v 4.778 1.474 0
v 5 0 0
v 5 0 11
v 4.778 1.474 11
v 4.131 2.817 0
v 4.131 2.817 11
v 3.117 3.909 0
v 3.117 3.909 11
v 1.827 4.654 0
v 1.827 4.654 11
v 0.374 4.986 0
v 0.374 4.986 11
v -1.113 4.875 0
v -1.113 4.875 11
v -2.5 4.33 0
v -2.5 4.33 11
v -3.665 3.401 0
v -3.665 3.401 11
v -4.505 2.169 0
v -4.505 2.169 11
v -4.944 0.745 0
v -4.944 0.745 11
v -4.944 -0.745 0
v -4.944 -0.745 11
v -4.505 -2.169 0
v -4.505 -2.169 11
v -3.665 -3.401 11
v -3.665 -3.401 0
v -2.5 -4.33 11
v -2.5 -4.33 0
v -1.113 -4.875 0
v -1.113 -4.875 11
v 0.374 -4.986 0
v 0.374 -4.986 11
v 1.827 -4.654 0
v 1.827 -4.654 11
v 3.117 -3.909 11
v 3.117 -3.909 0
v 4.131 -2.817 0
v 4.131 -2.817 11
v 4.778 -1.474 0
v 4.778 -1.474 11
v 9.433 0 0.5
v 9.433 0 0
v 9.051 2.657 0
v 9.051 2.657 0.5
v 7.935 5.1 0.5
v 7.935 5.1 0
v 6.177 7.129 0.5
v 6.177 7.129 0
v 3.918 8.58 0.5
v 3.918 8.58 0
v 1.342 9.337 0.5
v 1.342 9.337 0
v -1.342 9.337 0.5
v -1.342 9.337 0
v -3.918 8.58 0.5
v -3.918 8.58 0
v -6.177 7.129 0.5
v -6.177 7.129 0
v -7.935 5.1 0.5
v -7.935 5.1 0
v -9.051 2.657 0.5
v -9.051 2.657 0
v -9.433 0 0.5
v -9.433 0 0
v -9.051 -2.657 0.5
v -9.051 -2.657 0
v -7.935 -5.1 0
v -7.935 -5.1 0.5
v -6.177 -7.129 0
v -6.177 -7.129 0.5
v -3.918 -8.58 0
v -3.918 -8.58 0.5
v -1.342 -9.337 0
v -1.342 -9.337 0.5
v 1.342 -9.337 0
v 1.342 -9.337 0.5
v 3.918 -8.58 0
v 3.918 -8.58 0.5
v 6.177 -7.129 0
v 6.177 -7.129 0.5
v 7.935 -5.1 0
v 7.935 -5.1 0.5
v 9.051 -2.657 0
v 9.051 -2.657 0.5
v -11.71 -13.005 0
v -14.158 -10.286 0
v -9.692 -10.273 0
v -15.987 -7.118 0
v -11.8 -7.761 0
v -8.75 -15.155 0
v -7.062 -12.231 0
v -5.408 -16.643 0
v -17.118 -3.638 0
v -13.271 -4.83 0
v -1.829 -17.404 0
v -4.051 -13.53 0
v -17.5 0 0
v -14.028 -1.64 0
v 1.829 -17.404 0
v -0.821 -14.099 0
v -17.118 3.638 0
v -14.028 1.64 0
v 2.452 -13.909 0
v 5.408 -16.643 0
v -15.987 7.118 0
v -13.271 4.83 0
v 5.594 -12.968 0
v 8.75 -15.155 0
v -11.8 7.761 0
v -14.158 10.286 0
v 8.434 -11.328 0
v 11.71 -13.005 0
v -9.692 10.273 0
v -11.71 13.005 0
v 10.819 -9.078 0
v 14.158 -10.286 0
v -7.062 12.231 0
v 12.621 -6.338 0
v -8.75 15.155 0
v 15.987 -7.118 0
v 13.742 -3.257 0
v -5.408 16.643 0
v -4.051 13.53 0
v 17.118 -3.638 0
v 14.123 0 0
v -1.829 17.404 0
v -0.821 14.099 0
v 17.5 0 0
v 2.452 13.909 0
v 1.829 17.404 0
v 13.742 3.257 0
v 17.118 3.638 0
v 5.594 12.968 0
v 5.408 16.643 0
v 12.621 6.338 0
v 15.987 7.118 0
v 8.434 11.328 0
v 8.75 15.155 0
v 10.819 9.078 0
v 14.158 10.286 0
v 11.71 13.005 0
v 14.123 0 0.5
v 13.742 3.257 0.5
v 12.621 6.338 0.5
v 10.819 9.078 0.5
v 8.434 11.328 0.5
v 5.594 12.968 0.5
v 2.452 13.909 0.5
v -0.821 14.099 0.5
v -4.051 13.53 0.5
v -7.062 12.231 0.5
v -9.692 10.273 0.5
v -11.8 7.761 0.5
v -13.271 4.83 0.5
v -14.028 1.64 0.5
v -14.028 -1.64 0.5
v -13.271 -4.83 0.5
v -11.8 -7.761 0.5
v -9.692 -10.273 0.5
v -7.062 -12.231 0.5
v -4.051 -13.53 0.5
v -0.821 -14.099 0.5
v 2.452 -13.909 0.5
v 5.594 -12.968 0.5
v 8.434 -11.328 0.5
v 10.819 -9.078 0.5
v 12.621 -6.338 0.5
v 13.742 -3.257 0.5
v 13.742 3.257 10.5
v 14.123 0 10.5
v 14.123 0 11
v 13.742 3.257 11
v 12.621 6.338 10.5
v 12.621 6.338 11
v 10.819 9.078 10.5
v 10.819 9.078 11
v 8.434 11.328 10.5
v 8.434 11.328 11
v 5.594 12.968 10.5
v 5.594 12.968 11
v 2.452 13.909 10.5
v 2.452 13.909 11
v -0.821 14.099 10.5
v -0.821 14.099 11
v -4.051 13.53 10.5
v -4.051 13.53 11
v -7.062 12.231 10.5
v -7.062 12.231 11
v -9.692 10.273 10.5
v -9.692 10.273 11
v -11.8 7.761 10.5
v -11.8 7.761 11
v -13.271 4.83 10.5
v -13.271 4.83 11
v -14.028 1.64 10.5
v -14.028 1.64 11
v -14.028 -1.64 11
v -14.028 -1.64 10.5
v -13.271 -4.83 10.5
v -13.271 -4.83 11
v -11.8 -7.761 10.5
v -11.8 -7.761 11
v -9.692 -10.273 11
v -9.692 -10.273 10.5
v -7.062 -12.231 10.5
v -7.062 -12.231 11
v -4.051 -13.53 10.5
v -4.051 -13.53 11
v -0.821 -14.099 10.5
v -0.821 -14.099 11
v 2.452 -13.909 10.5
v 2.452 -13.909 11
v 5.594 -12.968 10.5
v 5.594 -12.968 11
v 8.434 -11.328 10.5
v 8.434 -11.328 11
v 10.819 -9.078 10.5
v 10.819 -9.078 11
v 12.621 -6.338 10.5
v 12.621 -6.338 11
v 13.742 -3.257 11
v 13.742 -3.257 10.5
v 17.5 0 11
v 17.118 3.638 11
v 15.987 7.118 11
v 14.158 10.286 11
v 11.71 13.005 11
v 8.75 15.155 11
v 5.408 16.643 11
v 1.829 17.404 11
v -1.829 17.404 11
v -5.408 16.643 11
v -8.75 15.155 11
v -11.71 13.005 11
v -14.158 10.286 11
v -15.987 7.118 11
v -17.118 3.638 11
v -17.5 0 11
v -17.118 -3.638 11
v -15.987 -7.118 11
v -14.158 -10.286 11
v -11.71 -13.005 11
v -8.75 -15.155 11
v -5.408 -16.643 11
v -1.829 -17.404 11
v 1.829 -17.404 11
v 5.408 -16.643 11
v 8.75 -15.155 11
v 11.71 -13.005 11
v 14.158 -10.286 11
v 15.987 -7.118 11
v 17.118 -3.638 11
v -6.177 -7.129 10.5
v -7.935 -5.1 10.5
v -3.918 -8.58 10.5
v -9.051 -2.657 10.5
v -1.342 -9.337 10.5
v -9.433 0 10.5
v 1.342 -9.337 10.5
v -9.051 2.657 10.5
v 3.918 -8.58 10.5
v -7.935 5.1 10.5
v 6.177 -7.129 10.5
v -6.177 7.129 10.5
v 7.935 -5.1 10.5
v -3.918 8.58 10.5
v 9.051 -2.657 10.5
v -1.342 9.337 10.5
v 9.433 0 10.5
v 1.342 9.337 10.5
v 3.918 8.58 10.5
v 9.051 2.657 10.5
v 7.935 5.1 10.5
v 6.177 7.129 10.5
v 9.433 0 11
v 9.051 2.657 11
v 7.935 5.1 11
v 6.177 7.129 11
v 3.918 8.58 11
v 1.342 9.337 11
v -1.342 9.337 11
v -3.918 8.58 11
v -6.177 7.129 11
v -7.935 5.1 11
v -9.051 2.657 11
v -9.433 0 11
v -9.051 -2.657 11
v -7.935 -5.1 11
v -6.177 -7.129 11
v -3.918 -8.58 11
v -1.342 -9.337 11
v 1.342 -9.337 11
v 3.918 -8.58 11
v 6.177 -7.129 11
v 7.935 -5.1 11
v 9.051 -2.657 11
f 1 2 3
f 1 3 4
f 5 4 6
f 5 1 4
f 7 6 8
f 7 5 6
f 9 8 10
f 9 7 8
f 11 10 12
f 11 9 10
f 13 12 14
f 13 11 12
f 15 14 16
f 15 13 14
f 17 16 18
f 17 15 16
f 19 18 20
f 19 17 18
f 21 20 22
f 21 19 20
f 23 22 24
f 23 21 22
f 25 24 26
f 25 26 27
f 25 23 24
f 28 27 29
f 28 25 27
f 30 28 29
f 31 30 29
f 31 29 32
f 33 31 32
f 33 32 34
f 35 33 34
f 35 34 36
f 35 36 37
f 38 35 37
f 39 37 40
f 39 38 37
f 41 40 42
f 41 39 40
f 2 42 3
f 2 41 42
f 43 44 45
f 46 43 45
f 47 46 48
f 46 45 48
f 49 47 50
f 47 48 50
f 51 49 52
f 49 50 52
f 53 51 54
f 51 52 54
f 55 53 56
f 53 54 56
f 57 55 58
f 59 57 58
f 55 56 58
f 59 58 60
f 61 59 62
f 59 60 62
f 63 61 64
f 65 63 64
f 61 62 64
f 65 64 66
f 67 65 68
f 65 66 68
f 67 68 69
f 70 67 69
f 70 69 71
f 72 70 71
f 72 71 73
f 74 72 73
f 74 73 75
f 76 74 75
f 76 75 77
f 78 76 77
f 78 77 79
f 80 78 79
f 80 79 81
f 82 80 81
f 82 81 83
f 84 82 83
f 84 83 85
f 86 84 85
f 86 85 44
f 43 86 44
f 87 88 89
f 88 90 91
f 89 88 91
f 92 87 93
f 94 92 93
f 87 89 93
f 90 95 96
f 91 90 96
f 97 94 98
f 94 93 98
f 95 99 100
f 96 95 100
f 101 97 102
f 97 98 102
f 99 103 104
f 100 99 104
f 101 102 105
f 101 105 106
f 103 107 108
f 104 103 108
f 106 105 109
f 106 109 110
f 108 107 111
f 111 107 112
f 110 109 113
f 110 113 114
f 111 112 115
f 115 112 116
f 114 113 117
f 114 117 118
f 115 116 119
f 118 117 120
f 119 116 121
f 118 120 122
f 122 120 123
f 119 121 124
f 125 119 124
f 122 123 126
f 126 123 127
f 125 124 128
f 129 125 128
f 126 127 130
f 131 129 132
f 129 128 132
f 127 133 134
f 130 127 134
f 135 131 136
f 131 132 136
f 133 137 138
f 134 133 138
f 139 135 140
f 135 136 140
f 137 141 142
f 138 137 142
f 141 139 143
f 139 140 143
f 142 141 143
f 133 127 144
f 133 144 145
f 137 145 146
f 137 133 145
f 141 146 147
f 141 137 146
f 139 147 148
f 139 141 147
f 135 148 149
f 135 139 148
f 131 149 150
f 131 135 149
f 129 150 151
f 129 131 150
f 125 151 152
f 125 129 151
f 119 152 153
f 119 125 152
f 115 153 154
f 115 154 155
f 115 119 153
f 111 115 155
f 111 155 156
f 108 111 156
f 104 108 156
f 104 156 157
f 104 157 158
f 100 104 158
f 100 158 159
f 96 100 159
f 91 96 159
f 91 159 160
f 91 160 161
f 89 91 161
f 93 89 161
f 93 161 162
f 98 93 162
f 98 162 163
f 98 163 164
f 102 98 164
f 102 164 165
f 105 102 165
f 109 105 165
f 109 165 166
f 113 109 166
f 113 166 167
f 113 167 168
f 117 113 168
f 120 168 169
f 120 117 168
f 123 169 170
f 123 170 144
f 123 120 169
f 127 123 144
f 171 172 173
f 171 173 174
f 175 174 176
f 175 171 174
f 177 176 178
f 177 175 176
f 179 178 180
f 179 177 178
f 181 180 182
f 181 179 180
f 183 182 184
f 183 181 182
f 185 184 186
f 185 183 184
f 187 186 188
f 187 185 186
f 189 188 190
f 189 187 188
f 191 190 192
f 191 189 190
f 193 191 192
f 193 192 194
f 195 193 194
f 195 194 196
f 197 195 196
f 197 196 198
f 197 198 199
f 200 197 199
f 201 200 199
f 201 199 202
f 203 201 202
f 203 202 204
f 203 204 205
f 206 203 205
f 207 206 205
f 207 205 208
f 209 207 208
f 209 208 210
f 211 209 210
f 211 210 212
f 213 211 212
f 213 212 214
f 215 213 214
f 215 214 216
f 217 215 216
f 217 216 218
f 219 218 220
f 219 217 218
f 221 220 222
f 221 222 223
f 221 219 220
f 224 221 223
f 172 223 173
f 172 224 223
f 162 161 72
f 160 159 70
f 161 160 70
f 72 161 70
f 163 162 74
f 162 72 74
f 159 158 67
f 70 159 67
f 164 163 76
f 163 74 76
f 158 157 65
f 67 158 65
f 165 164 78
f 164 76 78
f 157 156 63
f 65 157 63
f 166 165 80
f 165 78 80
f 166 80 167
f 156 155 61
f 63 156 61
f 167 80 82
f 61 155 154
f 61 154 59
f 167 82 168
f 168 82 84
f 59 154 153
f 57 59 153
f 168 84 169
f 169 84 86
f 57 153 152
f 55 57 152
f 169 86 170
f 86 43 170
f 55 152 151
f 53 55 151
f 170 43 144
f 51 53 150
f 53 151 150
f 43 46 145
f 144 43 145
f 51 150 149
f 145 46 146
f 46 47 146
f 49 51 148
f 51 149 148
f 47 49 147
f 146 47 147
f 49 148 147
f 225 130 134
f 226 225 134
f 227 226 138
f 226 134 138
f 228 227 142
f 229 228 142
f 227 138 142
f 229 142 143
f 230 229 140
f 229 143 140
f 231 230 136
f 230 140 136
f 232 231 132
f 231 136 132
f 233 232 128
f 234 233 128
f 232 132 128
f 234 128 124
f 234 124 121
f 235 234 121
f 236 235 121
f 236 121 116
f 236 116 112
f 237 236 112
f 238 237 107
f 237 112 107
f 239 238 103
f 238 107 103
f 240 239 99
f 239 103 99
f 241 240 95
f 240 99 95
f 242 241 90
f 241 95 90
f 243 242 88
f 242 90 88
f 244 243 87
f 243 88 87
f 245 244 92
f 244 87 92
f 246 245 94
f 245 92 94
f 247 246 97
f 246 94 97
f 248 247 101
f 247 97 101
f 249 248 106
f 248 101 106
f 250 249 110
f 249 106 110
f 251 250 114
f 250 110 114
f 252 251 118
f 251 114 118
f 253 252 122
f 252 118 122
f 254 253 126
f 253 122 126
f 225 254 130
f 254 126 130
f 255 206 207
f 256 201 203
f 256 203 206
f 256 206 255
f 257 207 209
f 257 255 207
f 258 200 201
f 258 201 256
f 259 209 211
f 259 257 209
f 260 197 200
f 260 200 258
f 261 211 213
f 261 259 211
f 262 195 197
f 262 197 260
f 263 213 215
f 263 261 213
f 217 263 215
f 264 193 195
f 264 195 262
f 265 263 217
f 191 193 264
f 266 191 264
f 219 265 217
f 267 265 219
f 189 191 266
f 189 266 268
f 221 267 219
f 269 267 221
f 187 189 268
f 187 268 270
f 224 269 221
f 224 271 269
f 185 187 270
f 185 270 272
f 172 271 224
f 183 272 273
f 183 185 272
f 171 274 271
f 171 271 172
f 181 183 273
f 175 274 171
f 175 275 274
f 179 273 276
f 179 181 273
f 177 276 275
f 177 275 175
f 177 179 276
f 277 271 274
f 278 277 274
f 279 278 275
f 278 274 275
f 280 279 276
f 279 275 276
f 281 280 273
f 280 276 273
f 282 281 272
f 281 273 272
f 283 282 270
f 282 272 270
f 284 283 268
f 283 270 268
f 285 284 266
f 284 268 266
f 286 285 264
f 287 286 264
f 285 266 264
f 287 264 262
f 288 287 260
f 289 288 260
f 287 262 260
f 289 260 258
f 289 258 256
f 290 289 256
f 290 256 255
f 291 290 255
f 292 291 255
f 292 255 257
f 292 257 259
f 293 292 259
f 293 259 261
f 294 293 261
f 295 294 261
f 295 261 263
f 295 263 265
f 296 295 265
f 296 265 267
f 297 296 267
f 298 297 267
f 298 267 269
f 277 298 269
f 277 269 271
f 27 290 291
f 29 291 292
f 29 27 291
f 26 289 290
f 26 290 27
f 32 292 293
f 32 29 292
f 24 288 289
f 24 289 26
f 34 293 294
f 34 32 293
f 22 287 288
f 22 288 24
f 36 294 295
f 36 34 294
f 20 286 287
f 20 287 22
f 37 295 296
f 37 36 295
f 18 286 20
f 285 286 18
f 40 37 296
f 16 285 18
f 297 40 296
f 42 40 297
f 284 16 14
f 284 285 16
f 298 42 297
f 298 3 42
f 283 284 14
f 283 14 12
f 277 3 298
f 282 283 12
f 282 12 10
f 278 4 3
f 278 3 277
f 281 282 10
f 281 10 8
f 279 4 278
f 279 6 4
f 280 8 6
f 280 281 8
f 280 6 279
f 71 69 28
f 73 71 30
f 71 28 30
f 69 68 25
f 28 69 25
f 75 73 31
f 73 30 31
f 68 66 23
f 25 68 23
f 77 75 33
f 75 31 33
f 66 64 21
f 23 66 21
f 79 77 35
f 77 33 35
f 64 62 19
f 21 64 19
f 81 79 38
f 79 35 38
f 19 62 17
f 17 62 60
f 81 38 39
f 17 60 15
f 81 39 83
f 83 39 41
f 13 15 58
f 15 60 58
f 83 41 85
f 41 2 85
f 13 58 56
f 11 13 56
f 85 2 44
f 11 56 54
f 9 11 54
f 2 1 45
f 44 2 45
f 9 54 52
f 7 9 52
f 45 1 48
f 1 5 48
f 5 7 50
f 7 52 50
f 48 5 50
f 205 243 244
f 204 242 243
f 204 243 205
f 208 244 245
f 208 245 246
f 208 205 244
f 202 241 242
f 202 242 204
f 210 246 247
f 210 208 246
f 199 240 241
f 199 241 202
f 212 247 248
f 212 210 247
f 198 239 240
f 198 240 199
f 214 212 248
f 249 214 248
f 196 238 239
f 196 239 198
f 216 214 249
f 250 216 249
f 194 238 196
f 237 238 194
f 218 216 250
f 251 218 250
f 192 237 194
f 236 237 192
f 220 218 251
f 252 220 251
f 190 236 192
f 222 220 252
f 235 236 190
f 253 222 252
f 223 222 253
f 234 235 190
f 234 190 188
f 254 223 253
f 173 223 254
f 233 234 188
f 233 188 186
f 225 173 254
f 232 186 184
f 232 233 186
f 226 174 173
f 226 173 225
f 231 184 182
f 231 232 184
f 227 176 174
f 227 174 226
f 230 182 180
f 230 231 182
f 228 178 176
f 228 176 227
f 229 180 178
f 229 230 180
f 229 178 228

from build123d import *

# Parameters (mm, degrees)
F0_R     = 9.4326970336
F0_R_2   = 5
F1_DEPTH = 11
F0_R_3   = 17.5
F0_R_4   = 14.1231381544
F2_START = 0.5
F2_DEPTH = 10


with BuildPart() as f1:
    # F0 (on Top) → F1 (new body)
    with BuildSketch(Plane.XY):
        Circle(F0_R)
        Circle(F0_R_2, mode=Mode.SUBTRACT)
    extrude(amount=F1_DEPTH)



with BuildPart() as f1b:
    # F0 (on Top) → F1, piece 2 (new body)
    with BuildSketch(Plane.XY):
        Circle(F0_R_3)
        Circle(F0_R_4, mode=Mode.SUBTRACT)
    extrude(amount=F1_DEPTH)


with BuildPart() as f1_1:
    add(f1.part)

    add(f1b.part)  # F2 merges F1b
    # F0 (on Top) → F2 (join)
    with BuildSketch(Plane.XY.offset(F2_START)):
        Circle(F0_R_4)
        Circle(F0_R, mode=Mode.SUBTRACT)
    extrude(amount=F2_DEPTH)


solid = f1_1.part
